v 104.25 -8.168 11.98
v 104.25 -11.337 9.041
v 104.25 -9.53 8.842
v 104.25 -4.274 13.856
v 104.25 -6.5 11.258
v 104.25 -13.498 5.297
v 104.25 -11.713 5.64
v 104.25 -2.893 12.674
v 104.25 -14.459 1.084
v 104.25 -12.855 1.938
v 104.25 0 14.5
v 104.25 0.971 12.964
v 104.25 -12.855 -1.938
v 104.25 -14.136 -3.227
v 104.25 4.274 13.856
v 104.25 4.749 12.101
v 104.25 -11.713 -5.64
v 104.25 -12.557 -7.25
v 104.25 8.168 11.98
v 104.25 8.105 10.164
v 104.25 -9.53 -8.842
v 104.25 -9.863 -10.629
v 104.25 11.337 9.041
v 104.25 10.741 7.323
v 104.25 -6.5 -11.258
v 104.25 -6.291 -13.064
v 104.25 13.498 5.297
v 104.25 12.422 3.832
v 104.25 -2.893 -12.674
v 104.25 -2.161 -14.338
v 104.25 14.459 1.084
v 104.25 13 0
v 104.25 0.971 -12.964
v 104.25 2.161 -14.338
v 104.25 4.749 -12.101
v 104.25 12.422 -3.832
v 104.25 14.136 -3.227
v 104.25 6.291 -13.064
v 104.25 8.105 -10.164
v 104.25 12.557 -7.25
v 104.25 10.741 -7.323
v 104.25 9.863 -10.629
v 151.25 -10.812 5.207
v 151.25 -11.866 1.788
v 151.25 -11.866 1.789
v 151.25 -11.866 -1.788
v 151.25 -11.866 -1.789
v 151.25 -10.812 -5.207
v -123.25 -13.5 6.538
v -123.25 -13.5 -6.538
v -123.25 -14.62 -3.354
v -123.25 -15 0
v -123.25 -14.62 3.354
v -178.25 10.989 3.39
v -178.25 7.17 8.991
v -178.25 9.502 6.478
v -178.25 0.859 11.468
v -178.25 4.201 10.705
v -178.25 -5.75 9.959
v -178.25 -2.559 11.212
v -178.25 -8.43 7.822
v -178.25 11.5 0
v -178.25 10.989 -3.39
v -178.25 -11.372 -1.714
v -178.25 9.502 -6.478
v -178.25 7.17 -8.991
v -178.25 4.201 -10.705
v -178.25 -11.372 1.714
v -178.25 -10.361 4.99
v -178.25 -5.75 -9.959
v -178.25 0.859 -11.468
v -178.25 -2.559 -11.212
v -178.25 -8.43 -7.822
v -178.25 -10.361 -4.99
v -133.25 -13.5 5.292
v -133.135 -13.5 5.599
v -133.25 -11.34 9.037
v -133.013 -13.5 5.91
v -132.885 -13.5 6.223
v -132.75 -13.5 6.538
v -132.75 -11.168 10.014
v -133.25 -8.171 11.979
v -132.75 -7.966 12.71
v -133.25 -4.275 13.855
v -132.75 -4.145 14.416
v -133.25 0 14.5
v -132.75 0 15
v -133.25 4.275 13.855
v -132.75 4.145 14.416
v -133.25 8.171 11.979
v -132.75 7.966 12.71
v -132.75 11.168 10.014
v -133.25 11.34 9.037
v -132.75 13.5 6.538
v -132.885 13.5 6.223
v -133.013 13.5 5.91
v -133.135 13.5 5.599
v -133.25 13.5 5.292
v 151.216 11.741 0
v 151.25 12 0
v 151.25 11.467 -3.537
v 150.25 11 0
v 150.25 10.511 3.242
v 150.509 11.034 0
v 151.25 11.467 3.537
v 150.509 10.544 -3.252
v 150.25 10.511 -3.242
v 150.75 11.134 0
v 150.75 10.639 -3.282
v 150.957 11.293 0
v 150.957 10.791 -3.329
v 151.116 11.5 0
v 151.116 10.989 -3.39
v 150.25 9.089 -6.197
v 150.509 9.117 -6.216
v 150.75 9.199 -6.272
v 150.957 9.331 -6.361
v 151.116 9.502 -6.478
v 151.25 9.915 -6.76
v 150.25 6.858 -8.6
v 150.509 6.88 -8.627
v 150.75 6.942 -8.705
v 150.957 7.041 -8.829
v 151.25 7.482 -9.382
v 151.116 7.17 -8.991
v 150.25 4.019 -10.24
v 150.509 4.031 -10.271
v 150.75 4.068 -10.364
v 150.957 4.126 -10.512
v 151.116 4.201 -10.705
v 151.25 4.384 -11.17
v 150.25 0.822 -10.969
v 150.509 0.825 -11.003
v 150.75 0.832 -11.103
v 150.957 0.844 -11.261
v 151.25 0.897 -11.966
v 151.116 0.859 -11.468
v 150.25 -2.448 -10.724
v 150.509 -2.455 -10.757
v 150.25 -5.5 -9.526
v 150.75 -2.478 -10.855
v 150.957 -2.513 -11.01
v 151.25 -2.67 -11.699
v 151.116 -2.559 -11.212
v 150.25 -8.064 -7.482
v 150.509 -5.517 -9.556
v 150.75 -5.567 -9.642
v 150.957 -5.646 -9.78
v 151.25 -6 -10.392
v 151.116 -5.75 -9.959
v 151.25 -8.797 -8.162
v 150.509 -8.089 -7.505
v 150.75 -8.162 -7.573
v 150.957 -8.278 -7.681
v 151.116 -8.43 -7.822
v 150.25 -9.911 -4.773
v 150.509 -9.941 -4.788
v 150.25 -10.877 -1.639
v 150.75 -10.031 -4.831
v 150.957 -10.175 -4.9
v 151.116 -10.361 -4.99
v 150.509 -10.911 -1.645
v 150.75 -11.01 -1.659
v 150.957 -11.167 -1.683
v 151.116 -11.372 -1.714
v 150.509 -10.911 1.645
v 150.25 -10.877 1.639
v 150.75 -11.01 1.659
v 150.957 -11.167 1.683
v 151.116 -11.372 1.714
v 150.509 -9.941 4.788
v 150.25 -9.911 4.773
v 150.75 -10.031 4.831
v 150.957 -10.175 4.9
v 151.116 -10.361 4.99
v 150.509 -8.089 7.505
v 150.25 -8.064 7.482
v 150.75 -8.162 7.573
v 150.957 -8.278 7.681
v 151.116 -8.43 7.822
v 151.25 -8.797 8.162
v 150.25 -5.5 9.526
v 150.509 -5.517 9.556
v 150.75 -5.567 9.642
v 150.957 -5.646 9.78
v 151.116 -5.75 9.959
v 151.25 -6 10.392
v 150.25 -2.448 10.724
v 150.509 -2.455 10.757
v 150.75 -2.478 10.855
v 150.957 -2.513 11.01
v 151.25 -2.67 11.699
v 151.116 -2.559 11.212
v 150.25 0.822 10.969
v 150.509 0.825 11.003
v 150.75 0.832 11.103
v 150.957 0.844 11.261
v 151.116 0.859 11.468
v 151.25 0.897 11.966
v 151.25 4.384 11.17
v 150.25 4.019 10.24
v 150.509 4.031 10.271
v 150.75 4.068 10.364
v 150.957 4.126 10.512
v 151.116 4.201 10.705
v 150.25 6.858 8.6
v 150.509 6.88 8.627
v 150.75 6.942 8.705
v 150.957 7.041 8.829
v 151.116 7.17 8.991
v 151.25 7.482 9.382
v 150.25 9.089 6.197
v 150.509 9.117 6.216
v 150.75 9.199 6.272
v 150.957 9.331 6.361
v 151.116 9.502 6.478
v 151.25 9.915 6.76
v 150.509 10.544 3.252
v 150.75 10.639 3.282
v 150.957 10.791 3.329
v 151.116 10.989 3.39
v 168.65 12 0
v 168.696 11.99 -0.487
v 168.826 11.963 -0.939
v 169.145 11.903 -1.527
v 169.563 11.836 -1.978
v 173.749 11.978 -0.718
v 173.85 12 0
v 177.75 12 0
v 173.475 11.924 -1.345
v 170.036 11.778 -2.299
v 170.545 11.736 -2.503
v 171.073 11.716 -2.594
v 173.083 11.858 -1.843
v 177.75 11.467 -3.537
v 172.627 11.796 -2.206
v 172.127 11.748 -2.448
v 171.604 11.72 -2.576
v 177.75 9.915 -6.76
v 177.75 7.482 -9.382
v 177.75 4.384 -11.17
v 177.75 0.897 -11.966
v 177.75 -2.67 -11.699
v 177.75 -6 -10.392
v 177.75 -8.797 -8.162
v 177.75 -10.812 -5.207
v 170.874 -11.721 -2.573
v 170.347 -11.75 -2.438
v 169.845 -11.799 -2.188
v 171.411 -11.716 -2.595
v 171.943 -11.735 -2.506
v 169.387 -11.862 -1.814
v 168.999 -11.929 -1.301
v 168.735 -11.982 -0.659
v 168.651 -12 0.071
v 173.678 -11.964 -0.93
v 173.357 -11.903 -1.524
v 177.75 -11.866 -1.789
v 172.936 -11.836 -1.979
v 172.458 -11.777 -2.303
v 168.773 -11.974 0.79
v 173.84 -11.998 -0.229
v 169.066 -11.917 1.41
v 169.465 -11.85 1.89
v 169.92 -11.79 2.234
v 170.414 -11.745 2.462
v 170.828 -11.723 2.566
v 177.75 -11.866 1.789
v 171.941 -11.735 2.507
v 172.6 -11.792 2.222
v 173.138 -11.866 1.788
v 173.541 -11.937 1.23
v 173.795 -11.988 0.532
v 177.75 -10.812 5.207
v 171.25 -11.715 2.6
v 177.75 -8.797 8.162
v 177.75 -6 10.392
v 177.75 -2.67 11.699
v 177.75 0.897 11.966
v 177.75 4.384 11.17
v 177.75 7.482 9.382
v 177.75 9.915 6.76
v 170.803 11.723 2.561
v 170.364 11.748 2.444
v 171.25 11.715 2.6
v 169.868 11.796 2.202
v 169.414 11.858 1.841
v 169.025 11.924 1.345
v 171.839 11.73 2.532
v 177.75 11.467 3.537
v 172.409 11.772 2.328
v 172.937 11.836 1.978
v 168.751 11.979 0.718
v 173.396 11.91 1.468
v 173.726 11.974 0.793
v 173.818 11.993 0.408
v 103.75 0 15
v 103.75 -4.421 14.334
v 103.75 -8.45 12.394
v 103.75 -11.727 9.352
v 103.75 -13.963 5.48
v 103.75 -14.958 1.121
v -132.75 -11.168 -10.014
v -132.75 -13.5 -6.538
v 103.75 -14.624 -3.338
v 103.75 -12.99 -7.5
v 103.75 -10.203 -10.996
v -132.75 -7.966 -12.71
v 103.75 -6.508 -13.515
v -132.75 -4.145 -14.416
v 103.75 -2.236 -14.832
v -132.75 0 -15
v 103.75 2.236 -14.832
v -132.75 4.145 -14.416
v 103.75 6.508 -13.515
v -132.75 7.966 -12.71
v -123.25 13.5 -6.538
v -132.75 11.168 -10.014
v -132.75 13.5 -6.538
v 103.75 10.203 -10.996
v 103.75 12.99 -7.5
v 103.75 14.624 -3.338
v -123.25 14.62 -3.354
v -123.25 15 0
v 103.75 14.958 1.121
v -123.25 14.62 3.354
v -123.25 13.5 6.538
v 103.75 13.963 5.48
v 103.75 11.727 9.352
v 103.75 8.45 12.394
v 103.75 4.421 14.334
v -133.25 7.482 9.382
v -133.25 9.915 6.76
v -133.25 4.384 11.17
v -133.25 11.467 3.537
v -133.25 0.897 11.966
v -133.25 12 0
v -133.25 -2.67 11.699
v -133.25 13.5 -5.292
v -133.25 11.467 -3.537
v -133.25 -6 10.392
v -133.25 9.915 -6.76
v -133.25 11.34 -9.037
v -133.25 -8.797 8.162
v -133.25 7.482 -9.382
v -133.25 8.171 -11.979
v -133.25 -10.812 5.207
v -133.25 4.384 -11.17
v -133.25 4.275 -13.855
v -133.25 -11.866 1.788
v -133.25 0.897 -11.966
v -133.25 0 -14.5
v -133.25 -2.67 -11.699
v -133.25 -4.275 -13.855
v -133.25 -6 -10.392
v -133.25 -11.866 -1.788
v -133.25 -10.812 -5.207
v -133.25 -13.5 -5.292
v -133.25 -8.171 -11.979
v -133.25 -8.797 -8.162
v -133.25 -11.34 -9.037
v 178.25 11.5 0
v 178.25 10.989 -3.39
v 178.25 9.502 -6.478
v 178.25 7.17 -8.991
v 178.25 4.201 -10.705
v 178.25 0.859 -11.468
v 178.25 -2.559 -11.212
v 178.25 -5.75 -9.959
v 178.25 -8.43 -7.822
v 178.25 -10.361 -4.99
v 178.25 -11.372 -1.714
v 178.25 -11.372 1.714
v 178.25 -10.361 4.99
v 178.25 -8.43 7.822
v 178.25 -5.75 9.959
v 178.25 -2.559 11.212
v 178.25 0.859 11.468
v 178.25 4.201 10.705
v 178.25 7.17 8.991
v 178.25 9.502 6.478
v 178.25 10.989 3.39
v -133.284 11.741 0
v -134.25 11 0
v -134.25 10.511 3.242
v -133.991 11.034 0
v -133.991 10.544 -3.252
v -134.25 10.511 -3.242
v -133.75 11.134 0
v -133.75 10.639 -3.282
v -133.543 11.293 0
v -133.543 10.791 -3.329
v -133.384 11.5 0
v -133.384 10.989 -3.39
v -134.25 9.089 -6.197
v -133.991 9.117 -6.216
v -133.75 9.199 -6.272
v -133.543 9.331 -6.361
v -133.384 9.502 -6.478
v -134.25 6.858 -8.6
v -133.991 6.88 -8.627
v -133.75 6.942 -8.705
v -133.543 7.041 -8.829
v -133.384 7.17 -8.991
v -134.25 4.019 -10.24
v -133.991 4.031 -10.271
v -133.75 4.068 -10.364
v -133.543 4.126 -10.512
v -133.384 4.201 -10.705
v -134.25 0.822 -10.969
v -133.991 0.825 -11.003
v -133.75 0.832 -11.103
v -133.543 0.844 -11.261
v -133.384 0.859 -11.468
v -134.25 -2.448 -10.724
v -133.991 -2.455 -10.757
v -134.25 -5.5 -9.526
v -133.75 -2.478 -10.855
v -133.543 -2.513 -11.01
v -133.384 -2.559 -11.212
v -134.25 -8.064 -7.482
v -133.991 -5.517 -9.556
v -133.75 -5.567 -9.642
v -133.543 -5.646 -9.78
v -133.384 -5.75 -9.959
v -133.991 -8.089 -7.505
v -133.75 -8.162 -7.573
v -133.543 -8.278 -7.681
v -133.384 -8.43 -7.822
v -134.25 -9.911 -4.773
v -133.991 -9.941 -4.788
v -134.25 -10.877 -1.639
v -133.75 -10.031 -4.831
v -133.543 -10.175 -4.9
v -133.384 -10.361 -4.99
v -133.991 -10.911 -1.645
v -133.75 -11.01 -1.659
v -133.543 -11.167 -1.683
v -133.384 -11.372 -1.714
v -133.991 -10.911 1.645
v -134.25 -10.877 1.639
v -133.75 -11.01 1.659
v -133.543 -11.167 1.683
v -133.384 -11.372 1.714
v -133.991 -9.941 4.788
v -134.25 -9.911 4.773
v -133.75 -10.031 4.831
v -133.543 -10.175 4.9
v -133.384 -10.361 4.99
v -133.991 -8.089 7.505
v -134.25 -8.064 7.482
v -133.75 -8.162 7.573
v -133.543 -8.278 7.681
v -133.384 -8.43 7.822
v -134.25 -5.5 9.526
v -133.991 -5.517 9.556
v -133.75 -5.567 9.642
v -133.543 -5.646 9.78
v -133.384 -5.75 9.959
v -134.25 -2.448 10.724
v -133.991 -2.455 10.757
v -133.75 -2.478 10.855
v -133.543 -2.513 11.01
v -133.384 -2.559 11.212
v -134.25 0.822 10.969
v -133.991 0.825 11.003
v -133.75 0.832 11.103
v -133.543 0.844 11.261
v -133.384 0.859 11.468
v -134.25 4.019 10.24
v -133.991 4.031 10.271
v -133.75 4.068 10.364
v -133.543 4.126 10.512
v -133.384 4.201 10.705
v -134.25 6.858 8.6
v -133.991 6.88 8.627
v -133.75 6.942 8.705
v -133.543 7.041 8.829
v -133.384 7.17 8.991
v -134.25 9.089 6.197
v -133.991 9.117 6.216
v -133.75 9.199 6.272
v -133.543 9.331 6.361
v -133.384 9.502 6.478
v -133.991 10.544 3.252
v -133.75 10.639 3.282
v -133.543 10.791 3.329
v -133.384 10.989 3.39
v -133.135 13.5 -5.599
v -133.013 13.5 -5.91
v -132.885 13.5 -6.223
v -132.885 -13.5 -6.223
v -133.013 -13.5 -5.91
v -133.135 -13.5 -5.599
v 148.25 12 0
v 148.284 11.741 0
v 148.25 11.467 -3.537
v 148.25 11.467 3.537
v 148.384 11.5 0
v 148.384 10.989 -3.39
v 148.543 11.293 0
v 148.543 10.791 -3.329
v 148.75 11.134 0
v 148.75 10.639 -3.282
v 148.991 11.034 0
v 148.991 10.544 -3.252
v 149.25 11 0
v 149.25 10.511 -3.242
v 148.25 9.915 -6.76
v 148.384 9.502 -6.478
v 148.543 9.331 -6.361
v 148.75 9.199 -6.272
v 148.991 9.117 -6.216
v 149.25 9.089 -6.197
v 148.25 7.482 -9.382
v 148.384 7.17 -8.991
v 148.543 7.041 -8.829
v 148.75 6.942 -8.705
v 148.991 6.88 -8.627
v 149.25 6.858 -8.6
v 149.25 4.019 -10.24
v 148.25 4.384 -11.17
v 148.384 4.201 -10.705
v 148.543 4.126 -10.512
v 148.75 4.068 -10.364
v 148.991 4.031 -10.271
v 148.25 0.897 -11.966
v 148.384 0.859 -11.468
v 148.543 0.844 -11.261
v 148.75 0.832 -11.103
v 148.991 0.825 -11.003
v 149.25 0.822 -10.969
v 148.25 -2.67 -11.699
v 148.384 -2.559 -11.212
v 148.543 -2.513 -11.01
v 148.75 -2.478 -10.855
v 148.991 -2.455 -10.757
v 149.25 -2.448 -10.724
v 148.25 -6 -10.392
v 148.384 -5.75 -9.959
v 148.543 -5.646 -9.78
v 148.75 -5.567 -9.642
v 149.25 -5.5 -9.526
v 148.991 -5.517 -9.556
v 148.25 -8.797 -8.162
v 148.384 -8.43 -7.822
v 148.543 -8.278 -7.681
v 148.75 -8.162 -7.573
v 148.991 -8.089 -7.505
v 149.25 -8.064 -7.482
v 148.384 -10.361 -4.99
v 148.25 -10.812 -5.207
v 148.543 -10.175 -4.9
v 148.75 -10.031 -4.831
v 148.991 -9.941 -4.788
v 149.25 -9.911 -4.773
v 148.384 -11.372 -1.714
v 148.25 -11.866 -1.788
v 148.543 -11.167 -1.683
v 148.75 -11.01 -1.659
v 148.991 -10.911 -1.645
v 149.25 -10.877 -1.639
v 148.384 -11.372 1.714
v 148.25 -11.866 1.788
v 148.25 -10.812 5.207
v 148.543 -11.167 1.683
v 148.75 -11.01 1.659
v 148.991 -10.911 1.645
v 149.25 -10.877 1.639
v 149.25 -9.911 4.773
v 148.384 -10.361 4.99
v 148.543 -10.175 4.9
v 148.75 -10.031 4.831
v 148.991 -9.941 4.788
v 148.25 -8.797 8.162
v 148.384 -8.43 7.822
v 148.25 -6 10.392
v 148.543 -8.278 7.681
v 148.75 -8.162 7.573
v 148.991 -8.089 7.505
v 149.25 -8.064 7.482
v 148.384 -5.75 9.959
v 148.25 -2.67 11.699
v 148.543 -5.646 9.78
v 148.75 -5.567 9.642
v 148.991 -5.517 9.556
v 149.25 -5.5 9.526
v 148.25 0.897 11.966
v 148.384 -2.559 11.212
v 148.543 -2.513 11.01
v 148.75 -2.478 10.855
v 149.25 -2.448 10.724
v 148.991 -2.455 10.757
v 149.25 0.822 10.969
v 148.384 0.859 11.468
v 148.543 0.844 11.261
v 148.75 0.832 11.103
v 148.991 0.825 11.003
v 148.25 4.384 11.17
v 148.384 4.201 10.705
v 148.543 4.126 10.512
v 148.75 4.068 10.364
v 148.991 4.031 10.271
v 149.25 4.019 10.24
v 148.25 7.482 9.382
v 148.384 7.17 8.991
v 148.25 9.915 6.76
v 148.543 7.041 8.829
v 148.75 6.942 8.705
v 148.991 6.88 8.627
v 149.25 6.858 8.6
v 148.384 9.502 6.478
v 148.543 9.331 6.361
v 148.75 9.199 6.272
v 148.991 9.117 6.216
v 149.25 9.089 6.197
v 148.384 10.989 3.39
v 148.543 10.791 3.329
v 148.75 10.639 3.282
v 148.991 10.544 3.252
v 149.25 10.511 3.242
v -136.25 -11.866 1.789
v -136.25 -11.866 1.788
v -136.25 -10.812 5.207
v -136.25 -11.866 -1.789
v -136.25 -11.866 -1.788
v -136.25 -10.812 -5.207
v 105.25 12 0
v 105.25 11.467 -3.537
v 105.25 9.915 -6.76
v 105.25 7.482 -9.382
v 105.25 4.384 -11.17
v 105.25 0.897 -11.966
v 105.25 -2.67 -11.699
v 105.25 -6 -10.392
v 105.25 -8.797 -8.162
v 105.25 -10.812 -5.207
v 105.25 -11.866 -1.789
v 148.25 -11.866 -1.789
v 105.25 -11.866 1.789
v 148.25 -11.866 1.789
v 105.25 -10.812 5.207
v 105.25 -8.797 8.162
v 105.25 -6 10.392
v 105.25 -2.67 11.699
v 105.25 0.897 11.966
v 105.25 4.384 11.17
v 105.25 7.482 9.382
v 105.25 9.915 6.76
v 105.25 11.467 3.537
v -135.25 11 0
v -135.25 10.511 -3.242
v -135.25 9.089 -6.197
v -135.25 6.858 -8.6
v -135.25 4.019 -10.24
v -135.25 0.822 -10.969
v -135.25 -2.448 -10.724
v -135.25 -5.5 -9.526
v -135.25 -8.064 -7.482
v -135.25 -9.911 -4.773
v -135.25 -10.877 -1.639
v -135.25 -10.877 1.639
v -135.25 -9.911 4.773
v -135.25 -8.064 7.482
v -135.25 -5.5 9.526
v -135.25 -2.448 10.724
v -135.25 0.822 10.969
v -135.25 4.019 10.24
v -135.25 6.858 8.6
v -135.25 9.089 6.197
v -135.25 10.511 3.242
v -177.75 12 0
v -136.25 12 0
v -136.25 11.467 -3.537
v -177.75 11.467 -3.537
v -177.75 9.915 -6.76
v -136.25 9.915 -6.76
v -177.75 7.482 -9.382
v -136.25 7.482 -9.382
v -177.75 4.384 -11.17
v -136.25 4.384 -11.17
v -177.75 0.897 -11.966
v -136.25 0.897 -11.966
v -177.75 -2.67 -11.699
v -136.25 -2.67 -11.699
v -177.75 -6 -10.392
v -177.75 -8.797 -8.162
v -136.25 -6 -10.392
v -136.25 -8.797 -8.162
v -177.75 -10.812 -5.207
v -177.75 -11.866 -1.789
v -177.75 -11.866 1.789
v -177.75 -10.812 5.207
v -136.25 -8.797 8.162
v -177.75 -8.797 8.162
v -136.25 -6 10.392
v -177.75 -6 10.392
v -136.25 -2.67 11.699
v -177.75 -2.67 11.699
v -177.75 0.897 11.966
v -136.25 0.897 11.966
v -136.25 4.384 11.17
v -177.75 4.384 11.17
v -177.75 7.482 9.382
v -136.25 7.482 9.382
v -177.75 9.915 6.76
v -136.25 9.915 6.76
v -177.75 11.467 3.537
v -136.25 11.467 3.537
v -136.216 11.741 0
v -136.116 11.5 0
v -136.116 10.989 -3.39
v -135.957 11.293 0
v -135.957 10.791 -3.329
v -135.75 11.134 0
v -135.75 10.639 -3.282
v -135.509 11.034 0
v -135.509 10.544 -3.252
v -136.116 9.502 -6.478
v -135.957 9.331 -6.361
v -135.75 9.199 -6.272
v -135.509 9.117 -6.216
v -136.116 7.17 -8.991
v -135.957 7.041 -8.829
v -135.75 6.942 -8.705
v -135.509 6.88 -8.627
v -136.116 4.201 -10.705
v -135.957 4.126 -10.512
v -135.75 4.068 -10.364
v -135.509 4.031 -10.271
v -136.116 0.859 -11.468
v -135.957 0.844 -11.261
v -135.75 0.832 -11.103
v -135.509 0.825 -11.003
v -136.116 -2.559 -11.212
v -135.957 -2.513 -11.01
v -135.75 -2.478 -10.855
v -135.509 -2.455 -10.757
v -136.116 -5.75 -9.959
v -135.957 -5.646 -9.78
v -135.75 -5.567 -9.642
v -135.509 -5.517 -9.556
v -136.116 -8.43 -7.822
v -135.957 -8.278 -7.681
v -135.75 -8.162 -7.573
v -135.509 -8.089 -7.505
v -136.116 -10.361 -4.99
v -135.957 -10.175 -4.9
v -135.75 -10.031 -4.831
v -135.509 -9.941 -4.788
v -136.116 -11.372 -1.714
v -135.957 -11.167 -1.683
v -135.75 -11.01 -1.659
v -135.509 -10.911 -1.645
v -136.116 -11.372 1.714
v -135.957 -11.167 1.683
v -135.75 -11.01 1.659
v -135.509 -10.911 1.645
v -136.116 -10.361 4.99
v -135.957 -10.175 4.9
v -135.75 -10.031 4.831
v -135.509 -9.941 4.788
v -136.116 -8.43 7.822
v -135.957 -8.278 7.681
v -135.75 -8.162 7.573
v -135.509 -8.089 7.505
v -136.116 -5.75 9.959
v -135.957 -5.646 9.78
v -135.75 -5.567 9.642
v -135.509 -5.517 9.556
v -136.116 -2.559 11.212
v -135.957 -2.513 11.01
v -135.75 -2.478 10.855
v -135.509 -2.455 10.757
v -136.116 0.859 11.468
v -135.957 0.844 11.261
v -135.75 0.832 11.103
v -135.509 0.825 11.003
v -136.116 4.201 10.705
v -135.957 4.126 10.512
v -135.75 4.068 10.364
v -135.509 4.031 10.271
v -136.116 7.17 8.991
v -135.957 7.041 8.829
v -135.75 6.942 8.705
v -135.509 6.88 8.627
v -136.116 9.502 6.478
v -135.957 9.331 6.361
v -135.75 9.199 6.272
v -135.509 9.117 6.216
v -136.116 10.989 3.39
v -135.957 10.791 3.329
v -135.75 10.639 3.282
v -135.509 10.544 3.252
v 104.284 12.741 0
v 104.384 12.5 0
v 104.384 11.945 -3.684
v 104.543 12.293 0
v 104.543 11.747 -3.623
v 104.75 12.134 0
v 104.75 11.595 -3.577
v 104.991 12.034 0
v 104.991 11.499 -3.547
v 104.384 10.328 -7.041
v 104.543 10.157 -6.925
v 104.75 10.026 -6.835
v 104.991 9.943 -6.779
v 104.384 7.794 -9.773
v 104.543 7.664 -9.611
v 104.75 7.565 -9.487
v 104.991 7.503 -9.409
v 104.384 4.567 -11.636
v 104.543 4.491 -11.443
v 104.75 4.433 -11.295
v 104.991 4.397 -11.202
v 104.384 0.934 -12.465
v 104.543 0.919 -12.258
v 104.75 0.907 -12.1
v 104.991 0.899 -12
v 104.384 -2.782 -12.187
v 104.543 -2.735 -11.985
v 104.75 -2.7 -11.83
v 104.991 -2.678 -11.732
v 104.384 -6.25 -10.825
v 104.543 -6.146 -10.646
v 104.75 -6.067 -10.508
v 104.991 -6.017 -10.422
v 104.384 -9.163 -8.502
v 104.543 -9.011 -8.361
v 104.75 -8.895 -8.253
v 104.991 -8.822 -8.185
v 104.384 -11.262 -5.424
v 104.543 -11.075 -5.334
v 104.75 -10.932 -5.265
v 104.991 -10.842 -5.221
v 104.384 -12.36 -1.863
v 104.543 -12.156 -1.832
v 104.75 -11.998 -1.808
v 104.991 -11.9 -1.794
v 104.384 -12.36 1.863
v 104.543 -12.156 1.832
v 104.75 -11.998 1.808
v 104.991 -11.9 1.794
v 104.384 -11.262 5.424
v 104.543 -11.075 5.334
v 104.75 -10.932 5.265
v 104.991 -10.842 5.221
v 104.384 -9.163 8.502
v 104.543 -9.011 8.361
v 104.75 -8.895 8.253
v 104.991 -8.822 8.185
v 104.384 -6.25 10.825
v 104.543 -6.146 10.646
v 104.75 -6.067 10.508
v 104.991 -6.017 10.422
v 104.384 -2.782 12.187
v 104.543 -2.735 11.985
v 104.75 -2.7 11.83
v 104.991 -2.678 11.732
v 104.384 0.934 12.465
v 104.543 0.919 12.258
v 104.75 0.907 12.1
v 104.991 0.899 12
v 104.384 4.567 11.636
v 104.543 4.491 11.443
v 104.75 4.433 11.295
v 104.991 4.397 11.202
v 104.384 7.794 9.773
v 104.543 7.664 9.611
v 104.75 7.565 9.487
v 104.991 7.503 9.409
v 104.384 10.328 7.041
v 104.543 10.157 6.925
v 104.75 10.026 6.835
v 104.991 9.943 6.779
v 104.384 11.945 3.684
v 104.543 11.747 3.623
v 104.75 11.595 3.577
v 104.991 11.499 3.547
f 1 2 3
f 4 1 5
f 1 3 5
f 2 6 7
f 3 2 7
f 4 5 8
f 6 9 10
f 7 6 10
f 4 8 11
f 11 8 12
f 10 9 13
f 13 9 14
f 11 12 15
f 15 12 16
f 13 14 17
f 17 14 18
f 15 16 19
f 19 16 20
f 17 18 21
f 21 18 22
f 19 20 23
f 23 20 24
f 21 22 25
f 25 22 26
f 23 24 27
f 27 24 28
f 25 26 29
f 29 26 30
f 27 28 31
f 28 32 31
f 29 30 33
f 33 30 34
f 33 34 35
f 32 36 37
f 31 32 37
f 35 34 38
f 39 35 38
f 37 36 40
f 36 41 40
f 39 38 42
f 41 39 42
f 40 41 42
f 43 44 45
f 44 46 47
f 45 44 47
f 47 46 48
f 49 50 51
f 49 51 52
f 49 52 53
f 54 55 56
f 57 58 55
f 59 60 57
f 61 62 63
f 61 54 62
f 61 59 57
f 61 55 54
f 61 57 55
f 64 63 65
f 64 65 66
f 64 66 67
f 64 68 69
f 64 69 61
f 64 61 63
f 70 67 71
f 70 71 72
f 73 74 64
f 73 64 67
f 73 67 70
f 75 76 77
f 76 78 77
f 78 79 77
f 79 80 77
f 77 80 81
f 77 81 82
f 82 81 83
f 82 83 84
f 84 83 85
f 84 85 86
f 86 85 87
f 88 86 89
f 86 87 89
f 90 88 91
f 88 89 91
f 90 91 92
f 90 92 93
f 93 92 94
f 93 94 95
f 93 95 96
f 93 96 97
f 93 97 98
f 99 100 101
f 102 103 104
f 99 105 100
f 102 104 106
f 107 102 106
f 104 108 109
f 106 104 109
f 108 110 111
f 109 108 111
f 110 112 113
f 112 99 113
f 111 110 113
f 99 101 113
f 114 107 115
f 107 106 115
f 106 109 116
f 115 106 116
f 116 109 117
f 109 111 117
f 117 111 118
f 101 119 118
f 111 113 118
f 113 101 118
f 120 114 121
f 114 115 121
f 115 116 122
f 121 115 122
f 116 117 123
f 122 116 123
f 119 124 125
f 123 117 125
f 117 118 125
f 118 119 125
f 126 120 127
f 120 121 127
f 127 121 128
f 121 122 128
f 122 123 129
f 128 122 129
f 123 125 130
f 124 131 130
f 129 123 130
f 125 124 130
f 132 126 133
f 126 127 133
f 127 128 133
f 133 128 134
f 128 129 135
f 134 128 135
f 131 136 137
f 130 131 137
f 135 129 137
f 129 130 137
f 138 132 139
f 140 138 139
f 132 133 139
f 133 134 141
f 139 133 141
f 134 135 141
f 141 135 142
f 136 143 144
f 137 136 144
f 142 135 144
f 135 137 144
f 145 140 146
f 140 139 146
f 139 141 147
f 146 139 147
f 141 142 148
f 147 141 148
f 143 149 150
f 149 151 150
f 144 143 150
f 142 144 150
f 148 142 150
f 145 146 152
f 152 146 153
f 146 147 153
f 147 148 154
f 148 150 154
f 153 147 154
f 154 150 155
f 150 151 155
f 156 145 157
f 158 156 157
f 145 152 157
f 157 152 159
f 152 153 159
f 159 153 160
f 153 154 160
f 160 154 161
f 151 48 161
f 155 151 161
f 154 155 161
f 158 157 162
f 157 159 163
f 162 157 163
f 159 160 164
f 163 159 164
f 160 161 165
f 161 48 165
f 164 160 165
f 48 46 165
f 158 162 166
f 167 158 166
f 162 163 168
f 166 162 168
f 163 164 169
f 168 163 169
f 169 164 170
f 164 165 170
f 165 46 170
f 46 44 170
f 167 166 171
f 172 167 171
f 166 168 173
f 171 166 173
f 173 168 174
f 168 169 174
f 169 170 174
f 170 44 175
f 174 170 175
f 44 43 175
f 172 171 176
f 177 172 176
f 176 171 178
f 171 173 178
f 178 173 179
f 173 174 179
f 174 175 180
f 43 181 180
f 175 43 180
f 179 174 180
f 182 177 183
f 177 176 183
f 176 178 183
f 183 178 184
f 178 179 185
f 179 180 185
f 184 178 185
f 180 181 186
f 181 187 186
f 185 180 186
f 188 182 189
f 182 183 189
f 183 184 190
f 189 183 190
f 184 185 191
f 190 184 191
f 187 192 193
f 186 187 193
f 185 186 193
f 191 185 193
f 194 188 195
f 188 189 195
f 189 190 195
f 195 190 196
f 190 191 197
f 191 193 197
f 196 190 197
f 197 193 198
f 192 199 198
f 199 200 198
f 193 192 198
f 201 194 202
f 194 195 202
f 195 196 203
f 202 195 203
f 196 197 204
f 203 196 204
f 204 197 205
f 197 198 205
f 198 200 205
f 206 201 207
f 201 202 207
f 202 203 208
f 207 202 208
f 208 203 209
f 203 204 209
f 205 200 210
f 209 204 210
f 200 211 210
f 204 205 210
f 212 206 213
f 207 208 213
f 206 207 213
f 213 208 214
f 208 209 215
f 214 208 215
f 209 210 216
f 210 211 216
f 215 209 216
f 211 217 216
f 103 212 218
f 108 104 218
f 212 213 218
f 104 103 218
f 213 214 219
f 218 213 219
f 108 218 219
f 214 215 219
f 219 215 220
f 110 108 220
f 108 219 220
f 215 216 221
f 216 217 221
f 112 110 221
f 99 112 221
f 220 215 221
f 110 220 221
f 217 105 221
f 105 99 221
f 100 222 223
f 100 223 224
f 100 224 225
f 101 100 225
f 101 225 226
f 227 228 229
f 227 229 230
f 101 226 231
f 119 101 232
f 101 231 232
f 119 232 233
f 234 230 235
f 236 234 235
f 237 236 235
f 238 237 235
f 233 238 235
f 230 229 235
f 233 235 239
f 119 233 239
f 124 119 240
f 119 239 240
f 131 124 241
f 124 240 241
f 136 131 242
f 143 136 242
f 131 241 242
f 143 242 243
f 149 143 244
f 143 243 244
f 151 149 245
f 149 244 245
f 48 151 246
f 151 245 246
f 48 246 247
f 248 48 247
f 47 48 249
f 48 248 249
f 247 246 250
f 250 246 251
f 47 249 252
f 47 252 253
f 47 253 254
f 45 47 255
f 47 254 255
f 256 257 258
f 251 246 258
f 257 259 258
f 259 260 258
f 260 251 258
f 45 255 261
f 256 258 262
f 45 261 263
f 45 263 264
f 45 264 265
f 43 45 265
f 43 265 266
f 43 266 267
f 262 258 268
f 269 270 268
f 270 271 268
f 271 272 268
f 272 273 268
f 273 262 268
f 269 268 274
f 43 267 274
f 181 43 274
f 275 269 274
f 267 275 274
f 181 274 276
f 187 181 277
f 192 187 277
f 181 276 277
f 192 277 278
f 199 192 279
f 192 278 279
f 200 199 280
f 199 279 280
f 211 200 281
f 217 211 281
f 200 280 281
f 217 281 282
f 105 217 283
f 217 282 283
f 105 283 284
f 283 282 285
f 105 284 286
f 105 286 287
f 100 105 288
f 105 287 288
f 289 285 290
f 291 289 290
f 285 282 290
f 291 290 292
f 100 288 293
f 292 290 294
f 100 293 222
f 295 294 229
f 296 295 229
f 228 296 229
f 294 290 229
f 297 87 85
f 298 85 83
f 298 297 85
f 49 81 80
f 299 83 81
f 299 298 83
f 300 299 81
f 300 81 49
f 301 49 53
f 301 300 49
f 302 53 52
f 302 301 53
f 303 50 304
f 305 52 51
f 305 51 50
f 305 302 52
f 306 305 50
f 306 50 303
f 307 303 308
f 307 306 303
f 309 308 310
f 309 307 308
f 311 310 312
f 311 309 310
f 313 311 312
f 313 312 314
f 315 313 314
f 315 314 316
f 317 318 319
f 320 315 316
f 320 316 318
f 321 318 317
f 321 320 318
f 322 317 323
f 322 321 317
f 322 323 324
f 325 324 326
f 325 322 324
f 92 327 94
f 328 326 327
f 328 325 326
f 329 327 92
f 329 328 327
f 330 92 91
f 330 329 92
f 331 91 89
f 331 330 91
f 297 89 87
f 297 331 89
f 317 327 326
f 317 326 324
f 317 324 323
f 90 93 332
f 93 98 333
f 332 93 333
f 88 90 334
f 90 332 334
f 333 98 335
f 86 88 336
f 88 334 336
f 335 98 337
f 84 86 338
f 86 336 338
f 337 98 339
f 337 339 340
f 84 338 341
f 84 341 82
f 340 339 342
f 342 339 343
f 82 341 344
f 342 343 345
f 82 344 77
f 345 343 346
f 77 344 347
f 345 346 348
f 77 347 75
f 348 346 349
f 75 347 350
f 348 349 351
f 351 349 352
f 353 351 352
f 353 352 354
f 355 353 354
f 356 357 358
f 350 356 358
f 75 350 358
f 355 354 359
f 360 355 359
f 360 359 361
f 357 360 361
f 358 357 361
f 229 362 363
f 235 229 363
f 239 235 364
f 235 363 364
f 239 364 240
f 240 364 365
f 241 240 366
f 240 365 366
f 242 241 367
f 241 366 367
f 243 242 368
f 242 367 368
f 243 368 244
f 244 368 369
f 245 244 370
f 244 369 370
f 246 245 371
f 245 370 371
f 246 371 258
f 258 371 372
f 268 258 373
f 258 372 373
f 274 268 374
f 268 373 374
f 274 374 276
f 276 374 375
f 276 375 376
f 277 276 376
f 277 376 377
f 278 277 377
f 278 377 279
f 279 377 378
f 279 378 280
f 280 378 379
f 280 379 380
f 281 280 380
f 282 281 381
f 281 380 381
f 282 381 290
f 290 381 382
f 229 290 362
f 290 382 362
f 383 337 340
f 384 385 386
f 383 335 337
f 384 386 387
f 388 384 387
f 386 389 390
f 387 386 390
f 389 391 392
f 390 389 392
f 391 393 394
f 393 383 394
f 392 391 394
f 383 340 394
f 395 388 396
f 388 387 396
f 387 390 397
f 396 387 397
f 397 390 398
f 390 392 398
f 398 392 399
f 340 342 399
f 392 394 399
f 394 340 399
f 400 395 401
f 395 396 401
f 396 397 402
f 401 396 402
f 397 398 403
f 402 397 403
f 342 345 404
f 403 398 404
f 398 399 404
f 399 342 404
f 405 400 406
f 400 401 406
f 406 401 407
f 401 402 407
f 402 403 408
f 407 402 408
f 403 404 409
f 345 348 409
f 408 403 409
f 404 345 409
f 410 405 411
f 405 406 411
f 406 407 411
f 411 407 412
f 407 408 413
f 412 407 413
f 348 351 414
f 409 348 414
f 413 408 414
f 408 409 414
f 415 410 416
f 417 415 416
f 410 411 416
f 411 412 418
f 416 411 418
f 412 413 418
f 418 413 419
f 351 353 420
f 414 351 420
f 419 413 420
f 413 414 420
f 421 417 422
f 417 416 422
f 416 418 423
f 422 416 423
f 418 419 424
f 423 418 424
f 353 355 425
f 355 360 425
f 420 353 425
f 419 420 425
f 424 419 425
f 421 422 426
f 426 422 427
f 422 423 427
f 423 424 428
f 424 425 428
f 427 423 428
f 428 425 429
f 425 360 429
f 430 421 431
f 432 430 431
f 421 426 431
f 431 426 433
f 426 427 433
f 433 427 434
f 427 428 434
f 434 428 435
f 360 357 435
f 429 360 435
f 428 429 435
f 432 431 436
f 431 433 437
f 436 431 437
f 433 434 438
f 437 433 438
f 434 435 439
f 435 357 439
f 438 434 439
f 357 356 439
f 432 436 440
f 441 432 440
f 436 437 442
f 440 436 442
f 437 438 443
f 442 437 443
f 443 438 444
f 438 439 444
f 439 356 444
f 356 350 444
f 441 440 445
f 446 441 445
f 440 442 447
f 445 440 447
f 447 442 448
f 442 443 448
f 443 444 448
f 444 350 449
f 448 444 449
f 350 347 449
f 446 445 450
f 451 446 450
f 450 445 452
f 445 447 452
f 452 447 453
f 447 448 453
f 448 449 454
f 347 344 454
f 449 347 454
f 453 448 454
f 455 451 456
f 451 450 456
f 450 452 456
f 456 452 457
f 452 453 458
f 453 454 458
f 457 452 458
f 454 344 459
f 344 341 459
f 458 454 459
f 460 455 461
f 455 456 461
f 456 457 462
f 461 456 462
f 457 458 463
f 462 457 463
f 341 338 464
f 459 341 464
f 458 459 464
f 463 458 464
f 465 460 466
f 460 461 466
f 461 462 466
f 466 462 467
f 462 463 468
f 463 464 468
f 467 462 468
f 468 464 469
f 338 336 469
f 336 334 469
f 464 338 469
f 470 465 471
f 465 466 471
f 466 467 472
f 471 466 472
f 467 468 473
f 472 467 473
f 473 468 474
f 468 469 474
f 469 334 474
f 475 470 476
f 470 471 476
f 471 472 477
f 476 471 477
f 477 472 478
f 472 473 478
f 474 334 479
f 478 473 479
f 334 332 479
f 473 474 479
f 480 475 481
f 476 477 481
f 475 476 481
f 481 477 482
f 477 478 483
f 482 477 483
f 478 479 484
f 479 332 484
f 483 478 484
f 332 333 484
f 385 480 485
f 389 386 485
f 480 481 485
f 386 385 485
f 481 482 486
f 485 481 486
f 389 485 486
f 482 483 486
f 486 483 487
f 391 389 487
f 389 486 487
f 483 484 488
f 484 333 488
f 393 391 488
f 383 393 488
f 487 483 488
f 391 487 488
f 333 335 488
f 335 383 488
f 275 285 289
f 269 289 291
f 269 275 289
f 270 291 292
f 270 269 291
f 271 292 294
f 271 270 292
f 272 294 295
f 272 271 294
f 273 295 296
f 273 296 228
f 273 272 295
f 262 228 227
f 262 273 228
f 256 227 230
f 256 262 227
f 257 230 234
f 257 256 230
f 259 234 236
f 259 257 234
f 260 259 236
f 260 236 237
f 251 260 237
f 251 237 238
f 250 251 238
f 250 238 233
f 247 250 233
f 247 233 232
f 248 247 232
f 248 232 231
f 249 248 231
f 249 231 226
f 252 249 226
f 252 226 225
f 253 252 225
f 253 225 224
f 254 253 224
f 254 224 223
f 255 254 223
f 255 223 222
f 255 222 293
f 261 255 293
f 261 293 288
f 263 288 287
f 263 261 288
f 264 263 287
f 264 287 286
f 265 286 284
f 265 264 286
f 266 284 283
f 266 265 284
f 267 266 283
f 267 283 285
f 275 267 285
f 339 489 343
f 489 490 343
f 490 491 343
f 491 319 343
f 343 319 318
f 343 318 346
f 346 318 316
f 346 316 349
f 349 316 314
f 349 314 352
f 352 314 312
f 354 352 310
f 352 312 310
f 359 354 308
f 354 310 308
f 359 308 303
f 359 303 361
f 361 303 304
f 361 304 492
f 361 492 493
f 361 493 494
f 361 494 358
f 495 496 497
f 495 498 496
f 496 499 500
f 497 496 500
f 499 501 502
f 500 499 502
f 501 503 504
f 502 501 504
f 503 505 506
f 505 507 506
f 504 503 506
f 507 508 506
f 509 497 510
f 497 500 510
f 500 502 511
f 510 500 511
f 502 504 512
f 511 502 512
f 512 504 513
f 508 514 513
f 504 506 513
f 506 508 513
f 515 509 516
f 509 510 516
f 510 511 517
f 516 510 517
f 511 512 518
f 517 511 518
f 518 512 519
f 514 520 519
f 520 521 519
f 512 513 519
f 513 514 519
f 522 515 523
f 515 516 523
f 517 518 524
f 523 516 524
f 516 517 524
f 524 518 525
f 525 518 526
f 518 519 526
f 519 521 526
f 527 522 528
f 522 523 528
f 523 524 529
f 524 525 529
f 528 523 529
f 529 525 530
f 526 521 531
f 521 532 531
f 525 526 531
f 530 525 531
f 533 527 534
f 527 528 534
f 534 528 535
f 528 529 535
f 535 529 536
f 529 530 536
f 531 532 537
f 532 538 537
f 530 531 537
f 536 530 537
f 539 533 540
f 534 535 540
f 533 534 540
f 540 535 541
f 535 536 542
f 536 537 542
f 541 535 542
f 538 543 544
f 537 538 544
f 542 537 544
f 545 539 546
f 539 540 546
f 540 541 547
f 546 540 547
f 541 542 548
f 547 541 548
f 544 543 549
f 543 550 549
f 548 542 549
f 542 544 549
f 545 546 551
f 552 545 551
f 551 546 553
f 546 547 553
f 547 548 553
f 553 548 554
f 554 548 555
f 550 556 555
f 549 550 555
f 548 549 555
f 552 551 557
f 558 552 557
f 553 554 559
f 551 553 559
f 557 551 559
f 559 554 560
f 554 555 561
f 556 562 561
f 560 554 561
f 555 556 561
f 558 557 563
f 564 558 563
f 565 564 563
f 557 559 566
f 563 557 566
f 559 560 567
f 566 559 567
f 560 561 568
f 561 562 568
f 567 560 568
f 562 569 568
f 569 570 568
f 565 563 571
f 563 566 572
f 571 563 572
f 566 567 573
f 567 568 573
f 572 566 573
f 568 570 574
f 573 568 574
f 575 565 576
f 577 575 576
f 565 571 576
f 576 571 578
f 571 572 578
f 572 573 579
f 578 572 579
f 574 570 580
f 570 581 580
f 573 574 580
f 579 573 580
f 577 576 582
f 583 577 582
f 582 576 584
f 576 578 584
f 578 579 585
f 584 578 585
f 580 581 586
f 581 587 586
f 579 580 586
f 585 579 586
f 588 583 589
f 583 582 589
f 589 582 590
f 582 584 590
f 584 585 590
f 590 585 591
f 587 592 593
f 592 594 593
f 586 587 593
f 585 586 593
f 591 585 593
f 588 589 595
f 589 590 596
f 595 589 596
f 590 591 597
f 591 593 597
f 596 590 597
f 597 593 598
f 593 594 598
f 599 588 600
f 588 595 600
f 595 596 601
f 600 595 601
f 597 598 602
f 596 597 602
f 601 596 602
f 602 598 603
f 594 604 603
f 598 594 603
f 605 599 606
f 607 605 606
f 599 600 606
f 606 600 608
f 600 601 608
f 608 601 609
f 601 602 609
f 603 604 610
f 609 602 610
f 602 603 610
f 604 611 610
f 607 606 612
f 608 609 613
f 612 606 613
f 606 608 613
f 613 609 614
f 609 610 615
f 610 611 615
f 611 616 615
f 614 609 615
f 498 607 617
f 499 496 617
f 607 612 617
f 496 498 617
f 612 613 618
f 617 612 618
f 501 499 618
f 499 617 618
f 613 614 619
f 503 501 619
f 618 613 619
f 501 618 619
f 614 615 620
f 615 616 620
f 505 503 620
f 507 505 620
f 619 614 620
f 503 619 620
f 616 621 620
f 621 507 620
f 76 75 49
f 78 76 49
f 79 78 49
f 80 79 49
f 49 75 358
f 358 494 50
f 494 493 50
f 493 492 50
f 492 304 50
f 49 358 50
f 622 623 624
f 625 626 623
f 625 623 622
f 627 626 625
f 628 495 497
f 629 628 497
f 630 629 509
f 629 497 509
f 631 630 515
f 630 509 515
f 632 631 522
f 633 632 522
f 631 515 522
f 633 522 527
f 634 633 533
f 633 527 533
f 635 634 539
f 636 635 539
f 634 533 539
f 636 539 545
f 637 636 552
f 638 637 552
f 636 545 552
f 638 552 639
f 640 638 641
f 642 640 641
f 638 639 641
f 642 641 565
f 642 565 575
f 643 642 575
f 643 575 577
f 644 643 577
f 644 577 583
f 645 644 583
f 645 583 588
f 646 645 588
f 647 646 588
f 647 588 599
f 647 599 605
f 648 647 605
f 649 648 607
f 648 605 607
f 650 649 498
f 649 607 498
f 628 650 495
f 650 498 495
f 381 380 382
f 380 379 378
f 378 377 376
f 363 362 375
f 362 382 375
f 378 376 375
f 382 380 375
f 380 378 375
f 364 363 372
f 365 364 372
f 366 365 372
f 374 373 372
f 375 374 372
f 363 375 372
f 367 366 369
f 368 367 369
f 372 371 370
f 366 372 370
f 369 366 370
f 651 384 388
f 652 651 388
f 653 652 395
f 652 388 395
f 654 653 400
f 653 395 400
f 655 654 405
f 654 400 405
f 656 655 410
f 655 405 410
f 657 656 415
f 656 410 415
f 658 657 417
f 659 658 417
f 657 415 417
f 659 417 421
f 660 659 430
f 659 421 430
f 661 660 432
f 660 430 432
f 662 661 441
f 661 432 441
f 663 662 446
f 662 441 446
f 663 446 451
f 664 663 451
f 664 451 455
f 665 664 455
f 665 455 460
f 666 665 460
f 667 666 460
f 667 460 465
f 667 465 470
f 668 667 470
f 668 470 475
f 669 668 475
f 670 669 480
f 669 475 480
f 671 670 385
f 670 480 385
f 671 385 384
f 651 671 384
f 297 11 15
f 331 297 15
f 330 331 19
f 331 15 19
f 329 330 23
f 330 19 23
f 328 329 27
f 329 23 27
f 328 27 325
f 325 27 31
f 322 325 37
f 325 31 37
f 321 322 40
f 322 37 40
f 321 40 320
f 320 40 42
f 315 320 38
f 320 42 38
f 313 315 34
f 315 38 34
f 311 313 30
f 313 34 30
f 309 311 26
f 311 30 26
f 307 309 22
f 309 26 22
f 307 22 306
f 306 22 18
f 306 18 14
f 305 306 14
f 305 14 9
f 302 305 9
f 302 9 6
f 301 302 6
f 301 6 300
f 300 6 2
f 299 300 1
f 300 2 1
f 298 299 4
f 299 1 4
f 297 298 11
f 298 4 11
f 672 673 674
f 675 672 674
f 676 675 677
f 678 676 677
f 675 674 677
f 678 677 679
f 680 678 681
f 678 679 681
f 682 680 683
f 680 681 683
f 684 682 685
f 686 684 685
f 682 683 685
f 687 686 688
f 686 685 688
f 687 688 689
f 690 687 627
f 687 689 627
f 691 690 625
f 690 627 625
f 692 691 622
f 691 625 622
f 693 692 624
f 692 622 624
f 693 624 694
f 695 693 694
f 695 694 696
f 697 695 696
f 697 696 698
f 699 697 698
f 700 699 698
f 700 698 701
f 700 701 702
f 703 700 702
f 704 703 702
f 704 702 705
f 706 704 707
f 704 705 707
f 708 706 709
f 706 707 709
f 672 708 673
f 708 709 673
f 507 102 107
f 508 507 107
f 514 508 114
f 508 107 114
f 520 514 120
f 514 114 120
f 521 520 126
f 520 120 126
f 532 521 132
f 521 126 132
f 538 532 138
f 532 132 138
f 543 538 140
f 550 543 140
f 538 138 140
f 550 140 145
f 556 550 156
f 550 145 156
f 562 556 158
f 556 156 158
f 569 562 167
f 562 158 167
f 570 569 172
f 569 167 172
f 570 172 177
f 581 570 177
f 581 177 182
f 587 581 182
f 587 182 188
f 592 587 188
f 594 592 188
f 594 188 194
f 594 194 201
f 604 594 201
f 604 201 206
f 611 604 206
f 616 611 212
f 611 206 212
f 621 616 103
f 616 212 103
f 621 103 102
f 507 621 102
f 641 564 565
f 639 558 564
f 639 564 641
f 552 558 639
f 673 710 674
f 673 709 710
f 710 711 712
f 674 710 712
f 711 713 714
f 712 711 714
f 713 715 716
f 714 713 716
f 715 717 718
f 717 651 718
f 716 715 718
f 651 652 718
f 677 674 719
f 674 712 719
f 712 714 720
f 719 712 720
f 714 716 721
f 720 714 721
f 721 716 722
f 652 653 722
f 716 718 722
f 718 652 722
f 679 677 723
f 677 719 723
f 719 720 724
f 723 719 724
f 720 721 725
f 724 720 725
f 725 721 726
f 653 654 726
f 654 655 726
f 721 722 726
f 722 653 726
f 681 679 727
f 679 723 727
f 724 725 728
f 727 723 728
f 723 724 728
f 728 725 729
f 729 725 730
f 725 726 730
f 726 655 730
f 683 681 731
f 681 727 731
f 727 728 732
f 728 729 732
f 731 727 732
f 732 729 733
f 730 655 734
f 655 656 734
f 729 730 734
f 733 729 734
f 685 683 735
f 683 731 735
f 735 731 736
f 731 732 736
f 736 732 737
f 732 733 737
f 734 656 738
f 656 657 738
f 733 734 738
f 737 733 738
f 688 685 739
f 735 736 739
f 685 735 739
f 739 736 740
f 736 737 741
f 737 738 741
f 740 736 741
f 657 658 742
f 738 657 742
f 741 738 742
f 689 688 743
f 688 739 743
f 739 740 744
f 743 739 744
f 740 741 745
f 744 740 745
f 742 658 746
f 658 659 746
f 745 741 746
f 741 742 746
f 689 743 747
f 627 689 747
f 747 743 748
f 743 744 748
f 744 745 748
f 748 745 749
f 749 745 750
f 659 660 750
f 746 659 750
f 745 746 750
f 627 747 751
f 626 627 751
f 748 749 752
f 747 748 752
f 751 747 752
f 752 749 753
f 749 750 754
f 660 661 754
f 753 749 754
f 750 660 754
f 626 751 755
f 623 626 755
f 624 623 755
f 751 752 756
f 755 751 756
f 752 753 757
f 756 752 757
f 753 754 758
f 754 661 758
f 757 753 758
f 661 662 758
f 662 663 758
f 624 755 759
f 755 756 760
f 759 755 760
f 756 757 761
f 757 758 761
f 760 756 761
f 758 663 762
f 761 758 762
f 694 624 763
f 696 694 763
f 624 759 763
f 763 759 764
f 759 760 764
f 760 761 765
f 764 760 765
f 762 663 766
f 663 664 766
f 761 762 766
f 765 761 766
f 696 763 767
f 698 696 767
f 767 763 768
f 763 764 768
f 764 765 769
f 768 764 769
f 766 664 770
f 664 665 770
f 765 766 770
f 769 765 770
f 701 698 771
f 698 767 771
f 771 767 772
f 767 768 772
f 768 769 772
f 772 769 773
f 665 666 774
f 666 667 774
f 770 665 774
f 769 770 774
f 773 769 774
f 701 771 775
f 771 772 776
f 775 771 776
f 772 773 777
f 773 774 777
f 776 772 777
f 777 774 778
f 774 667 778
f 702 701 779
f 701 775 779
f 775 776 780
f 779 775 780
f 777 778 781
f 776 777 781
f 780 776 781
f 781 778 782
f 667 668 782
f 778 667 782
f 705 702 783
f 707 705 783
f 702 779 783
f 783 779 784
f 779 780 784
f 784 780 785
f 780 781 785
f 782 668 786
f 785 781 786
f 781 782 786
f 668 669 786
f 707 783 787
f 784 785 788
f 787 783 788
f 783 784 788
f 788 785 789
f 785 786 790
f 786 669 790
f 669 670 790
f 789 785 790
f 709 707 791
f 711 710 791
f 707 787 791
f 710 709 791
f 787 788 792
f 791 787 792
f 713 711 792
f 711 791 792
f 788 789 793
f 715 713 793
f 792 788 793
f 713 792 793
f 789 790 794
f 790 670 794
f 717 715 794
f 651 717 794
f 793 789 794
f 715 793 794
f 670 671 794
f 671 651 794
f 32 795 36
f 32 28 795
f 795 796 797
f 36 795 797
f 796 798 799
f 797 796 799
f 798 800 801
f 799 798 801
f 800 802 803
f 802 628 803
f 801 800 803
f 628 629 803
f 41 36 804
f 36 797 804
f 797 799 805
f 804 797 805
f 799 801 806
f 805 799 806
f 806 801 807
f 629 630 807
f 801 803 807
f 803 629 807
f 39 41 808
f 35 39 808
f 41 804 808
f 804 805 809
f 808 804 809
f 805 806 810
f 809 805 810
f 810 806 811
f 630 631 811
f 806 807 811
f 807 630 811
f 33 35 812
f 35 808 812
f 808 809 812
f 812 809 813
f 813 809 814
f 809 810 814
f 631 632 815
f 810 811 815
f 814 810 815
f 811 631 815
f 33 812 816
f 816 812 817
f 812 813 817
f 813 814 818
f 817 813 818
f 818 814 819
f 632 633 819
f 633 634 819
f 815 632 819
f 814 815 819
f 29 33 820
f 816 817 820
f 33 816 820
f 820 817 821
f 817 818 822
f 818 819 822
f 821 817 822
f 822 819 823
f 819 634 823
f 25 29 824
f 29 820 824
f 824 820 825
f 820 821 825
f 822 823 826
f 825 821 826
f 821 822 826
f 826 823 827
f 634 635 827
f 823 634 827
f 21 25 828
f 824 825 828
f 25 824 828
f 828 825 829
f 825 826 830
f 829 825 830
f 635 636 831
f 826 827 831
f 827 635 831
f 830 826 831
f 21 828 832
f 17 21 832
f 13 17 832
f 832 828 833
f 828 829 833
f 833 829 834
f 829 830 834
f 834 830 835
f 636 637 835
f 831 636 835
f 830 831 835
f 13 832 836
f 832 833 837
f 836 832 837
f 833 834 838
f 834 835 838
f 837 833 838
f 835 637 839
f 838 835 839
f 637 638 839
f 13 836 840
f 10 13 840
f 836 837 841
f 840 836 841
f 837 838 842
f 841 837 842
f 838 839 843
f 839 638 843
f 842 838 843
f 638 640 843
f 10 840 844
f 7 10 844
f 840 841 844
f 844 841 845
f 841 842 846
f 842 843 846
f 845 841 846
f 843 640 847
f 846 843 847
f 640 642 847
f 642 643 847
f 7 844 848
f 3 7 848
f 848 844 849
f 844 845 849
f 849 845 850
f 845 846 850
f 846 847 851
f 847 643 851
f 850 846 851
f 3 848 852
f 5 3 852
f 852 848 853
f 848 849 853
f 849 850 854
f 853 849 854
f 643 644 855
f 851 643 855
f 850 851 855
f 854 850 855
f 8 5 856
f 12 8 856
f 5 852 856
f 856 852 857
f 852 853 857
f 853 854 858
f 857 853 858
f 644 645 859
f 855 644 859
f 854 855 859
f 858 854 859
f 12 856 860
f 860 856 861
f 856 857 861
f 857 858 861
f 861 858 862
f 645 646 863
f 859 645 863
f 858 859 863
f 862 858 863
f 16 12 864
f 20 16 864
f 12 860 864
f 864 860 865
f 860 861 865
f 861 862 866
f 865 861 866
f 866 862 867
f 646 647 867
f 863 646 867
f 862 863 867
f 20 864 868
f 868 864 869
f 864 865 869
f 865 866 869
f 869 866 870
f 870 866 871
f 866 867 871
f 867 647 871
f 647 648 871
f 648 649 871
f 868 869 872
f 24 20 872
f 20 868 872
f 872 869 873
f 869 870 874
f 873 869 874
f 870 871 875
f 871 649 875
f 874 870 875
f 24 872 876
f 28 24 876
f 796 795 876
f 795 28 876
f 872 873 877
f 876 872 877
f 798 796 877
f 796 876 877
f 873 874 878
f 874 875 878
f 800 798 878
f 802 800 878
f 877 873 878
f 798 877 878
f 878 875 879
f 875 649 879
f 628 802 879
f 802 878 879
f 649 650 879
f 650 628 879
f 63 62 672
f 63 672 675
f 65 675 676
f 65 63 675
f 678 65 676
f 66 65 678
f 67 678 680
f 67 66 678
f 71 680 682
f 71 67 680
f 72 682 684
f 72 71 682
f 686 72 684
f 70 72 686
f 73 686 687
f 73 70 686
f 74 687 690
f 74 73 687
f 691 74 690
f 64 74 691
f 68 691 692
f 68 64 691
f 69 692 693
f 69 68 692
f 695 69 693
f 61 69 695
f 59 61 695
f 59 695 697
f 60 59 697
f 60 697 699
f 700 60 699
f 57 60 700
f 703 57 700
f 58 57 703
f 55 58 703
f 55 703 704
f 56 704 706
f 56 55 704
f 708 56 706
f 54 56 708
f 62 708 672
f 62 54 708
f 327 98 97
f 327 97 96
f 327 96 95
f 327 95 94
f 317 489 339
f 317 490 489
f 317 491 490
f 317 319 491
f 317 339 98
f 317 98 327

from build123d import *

# Parameters (mm, degrees)
SKETCH1_W               = 356.5
SKETCH1_H               = 15
SKETCH2_W               = 3
SKETCH2_H               = 1
CUT_EXTRUDE1_DEPTH      = 180.507834091
CUT_EXTRUDE1_DEPTH_BACK = 180.507834091
SKETCH3_R               = 2.6
CUT_EXTRUDE2_DEPTH      = 180.50783419
CUT_EXTRUDE2_DEPTH_BACK = 180.50783419
SKETCH4_W               = 10
SKETCH4_H               = 1.5
FILLET1_R               = 1
CHAMFER1_SIZE           = 0.5


with BuildPart() as part:
    # Sketch1 → Revolve1 (revolve)
    with BuildSketch(Plane.XY, mode=Mode.PRIVATE) as revolve1_sk:
        with Locations((0, 7.5)):
            Rectangle(SKETCH1_W, SKETCH1_H)
    revolve(revolve1_sk.sketch.rotate(Axis((-178.25, 0, 0), (1, 0, 0)), 90), axis=Axis((-178.25, 0, 0), (1, 0, 0)))

    # Sketch2 → Cut-Revolve1 (revolve, cut)
    with BuildSketch(Plane.XY):
        Polygon((178.25, 12), (178.25, 15), (104.25, 15), (104.25, 12), (148.25, 12), (151.25, 12), align=None)
        with Locations((149.75, 11.5)):
            Rectangle(SKETCH2_W, SKETCH2_H)
        Polygon((-133.25, 15), (-178.25, 15), (-178.25, 12), (-136.25, 12), (-133.25, 12), align=None)
        with Locations((-134.75, 11.5)):
            Rectangle(SKETCH2_W, SKETCH2_H)
    revolve(axis=Axis((178.25, 0, 0), (-1, 0, 0)), mode=Mode.SUBTRACT)

    # Sketch3 → Cut-Extrude1 (cut, two sides: drawn at the far end of the back side and taken through both)
    with BuildSketch(Plane(origin=(0, 0, 0), x_dir=(1, 0, 0), z_dir=(0, 1, 0)).offset(-CUT_EXTRUDE1_DEPTH_BACK)):
        with Locations(Location((171.25, 0, 0), (0, 0, 270))):
            Circle(SKETCH3_R)
    extrude(amount=CUT_EXTRUDE1_DEPTH + CUT_EXTRUDE1_DEPTH_BACK, mode=Mode.SUBTRACT)

    # Sketch4 → Cut-Extrude2 (cut, two sides: drawn at the far end of the back side and taken through both)
    with BuildSketch(Plane.XY.offset(-CUT_EXTRUDE2_DEPTH_BACK)):
        with Locations((-128.25, 14.25)):
            Rectangle(SKETCH4_W, SKETCH4_H)
        with Locations((-128.25, -14.25)):
            Rectangle(SKETCH4_W, SKETCH4_H)
    extrude(amount=CUT_EXTRUDE2_DEPTH + CUT_EXTRUDE2_DEPTH_BACK, mode=Mode.SUBTRACT)

    # Fillet1
    fillet1_edges = [part.edges().sort_by_distance(p)[0] for p in [
        (104.25, -12, 0),
        (151.25, -11, 0),
        (148.25, -11, 0),
        (-133.25, -11, 0),
        (-136.25, -11, 0),
    ]]
    fillet(fillet1_edges, radius=FILLET1_R - 0.0001)  # a hair under: the kernel refuses the full size

    # Chamfer1
    chamfer1_edges = [part.edges().sort_by_distance(p)[0] for p in [
        (178.25, -12, 0),
        (104.25, 0, -15),
        (-178.25, -12, 0),
        (-133.25, -7.966328319, 12.709744809),
        (-133.25, 0, -15),
    ]]
    chamfer(chamfer1_edges, length=CHAMFER1_SIZE)


solid = part.part
